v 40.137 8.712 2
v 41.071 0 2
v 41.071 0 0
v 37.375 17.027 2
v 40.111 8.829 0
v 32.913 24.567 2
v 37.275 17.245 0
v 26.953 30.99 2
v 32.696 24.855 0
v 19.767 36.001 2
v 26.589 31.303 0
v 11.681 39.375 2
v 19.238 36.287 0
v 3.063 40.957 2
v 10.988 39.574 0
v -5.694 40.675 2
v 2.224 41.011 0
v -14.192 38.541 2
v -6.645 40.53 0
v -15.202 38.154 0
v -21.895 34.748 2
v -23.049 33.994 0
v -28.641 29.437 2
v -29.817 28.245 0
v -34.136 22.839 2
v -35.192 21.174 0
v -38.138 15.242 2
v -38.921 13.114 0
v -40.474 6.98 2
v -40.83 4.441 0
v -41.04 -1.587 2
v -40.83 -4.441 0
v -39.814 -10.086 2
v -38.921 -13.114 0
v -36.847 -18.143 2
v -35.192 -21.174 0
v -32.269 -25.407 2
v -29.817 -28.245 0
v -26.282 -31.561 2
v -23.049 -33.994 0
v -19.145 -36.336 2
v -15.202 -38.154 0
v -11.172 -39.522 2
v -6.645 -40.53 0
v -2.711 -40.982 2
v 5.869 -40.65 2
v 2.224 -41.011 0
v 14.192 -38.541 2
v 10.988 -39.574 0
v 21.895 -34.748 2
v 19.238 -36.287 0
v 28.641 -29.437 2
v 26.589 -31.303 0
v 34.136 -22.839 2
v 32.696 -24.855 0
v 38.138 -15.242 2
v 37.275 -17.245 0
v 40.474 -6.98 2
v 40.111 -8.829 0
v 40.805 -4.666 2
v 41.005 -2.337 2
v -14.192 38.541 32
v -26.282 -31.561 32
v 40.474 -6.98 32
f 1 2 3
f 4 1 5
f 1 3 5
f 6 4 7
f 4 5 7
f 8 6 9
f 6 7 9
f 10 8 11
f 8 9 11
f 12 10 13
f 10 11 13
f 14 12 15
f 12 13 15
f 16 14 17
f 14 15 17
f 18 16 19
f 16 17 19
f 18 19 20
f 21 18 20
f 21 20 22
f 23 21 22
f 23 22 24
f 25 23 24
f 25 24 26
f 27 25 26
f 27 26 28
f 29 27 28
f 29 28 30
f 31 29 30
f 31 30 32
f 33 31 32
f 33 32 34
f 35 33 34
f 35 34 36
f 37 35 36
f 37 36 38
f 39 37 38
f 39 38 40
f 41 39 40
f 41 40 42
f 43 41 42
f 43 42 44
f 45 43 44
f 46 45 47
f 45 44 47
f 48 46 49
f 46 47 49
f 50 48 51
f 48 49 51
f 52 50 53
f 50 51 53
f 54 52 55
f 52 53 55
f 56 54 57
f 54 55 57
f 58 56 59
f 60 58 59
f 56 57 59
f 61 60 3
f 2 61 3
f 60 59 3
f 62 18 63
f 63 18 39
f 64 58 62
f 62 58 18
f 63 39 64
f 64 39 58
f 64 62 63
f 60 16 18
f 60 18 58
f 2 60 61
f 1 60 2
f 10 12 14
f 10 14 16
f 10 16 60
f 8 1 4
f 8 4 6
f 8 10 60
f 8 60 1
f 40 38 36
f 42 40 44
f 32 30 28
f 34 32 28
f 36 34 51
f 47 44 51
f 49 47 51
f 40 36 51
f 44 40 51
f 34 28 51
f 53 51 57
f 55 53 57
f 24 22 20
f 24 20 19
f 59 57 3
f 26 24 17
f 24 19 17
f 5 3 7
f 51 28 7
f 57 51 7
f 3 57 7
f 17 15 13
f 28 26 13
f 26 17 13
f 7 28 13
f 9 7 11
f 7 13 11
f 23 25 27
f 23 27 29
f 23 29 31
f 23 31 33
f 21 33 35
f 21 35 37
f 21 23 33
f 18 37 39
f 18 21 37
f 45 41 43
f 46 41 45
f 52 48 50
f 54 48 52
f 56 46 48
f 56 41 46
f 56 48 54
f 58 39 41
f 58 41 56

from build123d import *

# Parameters (mm, degrees)
F0_R     = 41.071152
F1_DEPTH = 2
F3_DEPTH = 30


with BuildPart() as f1:
    # F0 (on Top) → F1 (new body)
    with BuildSketch(Plane.XY):
        Circle(F0_R)
    extrude(amount=F1_DEPTH)

    # F2 (on face) → F3 (join)
    with BuildSketch(Plane.XY.offset(2)):
        Polygon((40.473684, -6.980005), (-14.19198, 38.541241), (-26.281704, -31.561236), align=None)
    extrude(amount=F3_DEPTH)


solid = f1.part
